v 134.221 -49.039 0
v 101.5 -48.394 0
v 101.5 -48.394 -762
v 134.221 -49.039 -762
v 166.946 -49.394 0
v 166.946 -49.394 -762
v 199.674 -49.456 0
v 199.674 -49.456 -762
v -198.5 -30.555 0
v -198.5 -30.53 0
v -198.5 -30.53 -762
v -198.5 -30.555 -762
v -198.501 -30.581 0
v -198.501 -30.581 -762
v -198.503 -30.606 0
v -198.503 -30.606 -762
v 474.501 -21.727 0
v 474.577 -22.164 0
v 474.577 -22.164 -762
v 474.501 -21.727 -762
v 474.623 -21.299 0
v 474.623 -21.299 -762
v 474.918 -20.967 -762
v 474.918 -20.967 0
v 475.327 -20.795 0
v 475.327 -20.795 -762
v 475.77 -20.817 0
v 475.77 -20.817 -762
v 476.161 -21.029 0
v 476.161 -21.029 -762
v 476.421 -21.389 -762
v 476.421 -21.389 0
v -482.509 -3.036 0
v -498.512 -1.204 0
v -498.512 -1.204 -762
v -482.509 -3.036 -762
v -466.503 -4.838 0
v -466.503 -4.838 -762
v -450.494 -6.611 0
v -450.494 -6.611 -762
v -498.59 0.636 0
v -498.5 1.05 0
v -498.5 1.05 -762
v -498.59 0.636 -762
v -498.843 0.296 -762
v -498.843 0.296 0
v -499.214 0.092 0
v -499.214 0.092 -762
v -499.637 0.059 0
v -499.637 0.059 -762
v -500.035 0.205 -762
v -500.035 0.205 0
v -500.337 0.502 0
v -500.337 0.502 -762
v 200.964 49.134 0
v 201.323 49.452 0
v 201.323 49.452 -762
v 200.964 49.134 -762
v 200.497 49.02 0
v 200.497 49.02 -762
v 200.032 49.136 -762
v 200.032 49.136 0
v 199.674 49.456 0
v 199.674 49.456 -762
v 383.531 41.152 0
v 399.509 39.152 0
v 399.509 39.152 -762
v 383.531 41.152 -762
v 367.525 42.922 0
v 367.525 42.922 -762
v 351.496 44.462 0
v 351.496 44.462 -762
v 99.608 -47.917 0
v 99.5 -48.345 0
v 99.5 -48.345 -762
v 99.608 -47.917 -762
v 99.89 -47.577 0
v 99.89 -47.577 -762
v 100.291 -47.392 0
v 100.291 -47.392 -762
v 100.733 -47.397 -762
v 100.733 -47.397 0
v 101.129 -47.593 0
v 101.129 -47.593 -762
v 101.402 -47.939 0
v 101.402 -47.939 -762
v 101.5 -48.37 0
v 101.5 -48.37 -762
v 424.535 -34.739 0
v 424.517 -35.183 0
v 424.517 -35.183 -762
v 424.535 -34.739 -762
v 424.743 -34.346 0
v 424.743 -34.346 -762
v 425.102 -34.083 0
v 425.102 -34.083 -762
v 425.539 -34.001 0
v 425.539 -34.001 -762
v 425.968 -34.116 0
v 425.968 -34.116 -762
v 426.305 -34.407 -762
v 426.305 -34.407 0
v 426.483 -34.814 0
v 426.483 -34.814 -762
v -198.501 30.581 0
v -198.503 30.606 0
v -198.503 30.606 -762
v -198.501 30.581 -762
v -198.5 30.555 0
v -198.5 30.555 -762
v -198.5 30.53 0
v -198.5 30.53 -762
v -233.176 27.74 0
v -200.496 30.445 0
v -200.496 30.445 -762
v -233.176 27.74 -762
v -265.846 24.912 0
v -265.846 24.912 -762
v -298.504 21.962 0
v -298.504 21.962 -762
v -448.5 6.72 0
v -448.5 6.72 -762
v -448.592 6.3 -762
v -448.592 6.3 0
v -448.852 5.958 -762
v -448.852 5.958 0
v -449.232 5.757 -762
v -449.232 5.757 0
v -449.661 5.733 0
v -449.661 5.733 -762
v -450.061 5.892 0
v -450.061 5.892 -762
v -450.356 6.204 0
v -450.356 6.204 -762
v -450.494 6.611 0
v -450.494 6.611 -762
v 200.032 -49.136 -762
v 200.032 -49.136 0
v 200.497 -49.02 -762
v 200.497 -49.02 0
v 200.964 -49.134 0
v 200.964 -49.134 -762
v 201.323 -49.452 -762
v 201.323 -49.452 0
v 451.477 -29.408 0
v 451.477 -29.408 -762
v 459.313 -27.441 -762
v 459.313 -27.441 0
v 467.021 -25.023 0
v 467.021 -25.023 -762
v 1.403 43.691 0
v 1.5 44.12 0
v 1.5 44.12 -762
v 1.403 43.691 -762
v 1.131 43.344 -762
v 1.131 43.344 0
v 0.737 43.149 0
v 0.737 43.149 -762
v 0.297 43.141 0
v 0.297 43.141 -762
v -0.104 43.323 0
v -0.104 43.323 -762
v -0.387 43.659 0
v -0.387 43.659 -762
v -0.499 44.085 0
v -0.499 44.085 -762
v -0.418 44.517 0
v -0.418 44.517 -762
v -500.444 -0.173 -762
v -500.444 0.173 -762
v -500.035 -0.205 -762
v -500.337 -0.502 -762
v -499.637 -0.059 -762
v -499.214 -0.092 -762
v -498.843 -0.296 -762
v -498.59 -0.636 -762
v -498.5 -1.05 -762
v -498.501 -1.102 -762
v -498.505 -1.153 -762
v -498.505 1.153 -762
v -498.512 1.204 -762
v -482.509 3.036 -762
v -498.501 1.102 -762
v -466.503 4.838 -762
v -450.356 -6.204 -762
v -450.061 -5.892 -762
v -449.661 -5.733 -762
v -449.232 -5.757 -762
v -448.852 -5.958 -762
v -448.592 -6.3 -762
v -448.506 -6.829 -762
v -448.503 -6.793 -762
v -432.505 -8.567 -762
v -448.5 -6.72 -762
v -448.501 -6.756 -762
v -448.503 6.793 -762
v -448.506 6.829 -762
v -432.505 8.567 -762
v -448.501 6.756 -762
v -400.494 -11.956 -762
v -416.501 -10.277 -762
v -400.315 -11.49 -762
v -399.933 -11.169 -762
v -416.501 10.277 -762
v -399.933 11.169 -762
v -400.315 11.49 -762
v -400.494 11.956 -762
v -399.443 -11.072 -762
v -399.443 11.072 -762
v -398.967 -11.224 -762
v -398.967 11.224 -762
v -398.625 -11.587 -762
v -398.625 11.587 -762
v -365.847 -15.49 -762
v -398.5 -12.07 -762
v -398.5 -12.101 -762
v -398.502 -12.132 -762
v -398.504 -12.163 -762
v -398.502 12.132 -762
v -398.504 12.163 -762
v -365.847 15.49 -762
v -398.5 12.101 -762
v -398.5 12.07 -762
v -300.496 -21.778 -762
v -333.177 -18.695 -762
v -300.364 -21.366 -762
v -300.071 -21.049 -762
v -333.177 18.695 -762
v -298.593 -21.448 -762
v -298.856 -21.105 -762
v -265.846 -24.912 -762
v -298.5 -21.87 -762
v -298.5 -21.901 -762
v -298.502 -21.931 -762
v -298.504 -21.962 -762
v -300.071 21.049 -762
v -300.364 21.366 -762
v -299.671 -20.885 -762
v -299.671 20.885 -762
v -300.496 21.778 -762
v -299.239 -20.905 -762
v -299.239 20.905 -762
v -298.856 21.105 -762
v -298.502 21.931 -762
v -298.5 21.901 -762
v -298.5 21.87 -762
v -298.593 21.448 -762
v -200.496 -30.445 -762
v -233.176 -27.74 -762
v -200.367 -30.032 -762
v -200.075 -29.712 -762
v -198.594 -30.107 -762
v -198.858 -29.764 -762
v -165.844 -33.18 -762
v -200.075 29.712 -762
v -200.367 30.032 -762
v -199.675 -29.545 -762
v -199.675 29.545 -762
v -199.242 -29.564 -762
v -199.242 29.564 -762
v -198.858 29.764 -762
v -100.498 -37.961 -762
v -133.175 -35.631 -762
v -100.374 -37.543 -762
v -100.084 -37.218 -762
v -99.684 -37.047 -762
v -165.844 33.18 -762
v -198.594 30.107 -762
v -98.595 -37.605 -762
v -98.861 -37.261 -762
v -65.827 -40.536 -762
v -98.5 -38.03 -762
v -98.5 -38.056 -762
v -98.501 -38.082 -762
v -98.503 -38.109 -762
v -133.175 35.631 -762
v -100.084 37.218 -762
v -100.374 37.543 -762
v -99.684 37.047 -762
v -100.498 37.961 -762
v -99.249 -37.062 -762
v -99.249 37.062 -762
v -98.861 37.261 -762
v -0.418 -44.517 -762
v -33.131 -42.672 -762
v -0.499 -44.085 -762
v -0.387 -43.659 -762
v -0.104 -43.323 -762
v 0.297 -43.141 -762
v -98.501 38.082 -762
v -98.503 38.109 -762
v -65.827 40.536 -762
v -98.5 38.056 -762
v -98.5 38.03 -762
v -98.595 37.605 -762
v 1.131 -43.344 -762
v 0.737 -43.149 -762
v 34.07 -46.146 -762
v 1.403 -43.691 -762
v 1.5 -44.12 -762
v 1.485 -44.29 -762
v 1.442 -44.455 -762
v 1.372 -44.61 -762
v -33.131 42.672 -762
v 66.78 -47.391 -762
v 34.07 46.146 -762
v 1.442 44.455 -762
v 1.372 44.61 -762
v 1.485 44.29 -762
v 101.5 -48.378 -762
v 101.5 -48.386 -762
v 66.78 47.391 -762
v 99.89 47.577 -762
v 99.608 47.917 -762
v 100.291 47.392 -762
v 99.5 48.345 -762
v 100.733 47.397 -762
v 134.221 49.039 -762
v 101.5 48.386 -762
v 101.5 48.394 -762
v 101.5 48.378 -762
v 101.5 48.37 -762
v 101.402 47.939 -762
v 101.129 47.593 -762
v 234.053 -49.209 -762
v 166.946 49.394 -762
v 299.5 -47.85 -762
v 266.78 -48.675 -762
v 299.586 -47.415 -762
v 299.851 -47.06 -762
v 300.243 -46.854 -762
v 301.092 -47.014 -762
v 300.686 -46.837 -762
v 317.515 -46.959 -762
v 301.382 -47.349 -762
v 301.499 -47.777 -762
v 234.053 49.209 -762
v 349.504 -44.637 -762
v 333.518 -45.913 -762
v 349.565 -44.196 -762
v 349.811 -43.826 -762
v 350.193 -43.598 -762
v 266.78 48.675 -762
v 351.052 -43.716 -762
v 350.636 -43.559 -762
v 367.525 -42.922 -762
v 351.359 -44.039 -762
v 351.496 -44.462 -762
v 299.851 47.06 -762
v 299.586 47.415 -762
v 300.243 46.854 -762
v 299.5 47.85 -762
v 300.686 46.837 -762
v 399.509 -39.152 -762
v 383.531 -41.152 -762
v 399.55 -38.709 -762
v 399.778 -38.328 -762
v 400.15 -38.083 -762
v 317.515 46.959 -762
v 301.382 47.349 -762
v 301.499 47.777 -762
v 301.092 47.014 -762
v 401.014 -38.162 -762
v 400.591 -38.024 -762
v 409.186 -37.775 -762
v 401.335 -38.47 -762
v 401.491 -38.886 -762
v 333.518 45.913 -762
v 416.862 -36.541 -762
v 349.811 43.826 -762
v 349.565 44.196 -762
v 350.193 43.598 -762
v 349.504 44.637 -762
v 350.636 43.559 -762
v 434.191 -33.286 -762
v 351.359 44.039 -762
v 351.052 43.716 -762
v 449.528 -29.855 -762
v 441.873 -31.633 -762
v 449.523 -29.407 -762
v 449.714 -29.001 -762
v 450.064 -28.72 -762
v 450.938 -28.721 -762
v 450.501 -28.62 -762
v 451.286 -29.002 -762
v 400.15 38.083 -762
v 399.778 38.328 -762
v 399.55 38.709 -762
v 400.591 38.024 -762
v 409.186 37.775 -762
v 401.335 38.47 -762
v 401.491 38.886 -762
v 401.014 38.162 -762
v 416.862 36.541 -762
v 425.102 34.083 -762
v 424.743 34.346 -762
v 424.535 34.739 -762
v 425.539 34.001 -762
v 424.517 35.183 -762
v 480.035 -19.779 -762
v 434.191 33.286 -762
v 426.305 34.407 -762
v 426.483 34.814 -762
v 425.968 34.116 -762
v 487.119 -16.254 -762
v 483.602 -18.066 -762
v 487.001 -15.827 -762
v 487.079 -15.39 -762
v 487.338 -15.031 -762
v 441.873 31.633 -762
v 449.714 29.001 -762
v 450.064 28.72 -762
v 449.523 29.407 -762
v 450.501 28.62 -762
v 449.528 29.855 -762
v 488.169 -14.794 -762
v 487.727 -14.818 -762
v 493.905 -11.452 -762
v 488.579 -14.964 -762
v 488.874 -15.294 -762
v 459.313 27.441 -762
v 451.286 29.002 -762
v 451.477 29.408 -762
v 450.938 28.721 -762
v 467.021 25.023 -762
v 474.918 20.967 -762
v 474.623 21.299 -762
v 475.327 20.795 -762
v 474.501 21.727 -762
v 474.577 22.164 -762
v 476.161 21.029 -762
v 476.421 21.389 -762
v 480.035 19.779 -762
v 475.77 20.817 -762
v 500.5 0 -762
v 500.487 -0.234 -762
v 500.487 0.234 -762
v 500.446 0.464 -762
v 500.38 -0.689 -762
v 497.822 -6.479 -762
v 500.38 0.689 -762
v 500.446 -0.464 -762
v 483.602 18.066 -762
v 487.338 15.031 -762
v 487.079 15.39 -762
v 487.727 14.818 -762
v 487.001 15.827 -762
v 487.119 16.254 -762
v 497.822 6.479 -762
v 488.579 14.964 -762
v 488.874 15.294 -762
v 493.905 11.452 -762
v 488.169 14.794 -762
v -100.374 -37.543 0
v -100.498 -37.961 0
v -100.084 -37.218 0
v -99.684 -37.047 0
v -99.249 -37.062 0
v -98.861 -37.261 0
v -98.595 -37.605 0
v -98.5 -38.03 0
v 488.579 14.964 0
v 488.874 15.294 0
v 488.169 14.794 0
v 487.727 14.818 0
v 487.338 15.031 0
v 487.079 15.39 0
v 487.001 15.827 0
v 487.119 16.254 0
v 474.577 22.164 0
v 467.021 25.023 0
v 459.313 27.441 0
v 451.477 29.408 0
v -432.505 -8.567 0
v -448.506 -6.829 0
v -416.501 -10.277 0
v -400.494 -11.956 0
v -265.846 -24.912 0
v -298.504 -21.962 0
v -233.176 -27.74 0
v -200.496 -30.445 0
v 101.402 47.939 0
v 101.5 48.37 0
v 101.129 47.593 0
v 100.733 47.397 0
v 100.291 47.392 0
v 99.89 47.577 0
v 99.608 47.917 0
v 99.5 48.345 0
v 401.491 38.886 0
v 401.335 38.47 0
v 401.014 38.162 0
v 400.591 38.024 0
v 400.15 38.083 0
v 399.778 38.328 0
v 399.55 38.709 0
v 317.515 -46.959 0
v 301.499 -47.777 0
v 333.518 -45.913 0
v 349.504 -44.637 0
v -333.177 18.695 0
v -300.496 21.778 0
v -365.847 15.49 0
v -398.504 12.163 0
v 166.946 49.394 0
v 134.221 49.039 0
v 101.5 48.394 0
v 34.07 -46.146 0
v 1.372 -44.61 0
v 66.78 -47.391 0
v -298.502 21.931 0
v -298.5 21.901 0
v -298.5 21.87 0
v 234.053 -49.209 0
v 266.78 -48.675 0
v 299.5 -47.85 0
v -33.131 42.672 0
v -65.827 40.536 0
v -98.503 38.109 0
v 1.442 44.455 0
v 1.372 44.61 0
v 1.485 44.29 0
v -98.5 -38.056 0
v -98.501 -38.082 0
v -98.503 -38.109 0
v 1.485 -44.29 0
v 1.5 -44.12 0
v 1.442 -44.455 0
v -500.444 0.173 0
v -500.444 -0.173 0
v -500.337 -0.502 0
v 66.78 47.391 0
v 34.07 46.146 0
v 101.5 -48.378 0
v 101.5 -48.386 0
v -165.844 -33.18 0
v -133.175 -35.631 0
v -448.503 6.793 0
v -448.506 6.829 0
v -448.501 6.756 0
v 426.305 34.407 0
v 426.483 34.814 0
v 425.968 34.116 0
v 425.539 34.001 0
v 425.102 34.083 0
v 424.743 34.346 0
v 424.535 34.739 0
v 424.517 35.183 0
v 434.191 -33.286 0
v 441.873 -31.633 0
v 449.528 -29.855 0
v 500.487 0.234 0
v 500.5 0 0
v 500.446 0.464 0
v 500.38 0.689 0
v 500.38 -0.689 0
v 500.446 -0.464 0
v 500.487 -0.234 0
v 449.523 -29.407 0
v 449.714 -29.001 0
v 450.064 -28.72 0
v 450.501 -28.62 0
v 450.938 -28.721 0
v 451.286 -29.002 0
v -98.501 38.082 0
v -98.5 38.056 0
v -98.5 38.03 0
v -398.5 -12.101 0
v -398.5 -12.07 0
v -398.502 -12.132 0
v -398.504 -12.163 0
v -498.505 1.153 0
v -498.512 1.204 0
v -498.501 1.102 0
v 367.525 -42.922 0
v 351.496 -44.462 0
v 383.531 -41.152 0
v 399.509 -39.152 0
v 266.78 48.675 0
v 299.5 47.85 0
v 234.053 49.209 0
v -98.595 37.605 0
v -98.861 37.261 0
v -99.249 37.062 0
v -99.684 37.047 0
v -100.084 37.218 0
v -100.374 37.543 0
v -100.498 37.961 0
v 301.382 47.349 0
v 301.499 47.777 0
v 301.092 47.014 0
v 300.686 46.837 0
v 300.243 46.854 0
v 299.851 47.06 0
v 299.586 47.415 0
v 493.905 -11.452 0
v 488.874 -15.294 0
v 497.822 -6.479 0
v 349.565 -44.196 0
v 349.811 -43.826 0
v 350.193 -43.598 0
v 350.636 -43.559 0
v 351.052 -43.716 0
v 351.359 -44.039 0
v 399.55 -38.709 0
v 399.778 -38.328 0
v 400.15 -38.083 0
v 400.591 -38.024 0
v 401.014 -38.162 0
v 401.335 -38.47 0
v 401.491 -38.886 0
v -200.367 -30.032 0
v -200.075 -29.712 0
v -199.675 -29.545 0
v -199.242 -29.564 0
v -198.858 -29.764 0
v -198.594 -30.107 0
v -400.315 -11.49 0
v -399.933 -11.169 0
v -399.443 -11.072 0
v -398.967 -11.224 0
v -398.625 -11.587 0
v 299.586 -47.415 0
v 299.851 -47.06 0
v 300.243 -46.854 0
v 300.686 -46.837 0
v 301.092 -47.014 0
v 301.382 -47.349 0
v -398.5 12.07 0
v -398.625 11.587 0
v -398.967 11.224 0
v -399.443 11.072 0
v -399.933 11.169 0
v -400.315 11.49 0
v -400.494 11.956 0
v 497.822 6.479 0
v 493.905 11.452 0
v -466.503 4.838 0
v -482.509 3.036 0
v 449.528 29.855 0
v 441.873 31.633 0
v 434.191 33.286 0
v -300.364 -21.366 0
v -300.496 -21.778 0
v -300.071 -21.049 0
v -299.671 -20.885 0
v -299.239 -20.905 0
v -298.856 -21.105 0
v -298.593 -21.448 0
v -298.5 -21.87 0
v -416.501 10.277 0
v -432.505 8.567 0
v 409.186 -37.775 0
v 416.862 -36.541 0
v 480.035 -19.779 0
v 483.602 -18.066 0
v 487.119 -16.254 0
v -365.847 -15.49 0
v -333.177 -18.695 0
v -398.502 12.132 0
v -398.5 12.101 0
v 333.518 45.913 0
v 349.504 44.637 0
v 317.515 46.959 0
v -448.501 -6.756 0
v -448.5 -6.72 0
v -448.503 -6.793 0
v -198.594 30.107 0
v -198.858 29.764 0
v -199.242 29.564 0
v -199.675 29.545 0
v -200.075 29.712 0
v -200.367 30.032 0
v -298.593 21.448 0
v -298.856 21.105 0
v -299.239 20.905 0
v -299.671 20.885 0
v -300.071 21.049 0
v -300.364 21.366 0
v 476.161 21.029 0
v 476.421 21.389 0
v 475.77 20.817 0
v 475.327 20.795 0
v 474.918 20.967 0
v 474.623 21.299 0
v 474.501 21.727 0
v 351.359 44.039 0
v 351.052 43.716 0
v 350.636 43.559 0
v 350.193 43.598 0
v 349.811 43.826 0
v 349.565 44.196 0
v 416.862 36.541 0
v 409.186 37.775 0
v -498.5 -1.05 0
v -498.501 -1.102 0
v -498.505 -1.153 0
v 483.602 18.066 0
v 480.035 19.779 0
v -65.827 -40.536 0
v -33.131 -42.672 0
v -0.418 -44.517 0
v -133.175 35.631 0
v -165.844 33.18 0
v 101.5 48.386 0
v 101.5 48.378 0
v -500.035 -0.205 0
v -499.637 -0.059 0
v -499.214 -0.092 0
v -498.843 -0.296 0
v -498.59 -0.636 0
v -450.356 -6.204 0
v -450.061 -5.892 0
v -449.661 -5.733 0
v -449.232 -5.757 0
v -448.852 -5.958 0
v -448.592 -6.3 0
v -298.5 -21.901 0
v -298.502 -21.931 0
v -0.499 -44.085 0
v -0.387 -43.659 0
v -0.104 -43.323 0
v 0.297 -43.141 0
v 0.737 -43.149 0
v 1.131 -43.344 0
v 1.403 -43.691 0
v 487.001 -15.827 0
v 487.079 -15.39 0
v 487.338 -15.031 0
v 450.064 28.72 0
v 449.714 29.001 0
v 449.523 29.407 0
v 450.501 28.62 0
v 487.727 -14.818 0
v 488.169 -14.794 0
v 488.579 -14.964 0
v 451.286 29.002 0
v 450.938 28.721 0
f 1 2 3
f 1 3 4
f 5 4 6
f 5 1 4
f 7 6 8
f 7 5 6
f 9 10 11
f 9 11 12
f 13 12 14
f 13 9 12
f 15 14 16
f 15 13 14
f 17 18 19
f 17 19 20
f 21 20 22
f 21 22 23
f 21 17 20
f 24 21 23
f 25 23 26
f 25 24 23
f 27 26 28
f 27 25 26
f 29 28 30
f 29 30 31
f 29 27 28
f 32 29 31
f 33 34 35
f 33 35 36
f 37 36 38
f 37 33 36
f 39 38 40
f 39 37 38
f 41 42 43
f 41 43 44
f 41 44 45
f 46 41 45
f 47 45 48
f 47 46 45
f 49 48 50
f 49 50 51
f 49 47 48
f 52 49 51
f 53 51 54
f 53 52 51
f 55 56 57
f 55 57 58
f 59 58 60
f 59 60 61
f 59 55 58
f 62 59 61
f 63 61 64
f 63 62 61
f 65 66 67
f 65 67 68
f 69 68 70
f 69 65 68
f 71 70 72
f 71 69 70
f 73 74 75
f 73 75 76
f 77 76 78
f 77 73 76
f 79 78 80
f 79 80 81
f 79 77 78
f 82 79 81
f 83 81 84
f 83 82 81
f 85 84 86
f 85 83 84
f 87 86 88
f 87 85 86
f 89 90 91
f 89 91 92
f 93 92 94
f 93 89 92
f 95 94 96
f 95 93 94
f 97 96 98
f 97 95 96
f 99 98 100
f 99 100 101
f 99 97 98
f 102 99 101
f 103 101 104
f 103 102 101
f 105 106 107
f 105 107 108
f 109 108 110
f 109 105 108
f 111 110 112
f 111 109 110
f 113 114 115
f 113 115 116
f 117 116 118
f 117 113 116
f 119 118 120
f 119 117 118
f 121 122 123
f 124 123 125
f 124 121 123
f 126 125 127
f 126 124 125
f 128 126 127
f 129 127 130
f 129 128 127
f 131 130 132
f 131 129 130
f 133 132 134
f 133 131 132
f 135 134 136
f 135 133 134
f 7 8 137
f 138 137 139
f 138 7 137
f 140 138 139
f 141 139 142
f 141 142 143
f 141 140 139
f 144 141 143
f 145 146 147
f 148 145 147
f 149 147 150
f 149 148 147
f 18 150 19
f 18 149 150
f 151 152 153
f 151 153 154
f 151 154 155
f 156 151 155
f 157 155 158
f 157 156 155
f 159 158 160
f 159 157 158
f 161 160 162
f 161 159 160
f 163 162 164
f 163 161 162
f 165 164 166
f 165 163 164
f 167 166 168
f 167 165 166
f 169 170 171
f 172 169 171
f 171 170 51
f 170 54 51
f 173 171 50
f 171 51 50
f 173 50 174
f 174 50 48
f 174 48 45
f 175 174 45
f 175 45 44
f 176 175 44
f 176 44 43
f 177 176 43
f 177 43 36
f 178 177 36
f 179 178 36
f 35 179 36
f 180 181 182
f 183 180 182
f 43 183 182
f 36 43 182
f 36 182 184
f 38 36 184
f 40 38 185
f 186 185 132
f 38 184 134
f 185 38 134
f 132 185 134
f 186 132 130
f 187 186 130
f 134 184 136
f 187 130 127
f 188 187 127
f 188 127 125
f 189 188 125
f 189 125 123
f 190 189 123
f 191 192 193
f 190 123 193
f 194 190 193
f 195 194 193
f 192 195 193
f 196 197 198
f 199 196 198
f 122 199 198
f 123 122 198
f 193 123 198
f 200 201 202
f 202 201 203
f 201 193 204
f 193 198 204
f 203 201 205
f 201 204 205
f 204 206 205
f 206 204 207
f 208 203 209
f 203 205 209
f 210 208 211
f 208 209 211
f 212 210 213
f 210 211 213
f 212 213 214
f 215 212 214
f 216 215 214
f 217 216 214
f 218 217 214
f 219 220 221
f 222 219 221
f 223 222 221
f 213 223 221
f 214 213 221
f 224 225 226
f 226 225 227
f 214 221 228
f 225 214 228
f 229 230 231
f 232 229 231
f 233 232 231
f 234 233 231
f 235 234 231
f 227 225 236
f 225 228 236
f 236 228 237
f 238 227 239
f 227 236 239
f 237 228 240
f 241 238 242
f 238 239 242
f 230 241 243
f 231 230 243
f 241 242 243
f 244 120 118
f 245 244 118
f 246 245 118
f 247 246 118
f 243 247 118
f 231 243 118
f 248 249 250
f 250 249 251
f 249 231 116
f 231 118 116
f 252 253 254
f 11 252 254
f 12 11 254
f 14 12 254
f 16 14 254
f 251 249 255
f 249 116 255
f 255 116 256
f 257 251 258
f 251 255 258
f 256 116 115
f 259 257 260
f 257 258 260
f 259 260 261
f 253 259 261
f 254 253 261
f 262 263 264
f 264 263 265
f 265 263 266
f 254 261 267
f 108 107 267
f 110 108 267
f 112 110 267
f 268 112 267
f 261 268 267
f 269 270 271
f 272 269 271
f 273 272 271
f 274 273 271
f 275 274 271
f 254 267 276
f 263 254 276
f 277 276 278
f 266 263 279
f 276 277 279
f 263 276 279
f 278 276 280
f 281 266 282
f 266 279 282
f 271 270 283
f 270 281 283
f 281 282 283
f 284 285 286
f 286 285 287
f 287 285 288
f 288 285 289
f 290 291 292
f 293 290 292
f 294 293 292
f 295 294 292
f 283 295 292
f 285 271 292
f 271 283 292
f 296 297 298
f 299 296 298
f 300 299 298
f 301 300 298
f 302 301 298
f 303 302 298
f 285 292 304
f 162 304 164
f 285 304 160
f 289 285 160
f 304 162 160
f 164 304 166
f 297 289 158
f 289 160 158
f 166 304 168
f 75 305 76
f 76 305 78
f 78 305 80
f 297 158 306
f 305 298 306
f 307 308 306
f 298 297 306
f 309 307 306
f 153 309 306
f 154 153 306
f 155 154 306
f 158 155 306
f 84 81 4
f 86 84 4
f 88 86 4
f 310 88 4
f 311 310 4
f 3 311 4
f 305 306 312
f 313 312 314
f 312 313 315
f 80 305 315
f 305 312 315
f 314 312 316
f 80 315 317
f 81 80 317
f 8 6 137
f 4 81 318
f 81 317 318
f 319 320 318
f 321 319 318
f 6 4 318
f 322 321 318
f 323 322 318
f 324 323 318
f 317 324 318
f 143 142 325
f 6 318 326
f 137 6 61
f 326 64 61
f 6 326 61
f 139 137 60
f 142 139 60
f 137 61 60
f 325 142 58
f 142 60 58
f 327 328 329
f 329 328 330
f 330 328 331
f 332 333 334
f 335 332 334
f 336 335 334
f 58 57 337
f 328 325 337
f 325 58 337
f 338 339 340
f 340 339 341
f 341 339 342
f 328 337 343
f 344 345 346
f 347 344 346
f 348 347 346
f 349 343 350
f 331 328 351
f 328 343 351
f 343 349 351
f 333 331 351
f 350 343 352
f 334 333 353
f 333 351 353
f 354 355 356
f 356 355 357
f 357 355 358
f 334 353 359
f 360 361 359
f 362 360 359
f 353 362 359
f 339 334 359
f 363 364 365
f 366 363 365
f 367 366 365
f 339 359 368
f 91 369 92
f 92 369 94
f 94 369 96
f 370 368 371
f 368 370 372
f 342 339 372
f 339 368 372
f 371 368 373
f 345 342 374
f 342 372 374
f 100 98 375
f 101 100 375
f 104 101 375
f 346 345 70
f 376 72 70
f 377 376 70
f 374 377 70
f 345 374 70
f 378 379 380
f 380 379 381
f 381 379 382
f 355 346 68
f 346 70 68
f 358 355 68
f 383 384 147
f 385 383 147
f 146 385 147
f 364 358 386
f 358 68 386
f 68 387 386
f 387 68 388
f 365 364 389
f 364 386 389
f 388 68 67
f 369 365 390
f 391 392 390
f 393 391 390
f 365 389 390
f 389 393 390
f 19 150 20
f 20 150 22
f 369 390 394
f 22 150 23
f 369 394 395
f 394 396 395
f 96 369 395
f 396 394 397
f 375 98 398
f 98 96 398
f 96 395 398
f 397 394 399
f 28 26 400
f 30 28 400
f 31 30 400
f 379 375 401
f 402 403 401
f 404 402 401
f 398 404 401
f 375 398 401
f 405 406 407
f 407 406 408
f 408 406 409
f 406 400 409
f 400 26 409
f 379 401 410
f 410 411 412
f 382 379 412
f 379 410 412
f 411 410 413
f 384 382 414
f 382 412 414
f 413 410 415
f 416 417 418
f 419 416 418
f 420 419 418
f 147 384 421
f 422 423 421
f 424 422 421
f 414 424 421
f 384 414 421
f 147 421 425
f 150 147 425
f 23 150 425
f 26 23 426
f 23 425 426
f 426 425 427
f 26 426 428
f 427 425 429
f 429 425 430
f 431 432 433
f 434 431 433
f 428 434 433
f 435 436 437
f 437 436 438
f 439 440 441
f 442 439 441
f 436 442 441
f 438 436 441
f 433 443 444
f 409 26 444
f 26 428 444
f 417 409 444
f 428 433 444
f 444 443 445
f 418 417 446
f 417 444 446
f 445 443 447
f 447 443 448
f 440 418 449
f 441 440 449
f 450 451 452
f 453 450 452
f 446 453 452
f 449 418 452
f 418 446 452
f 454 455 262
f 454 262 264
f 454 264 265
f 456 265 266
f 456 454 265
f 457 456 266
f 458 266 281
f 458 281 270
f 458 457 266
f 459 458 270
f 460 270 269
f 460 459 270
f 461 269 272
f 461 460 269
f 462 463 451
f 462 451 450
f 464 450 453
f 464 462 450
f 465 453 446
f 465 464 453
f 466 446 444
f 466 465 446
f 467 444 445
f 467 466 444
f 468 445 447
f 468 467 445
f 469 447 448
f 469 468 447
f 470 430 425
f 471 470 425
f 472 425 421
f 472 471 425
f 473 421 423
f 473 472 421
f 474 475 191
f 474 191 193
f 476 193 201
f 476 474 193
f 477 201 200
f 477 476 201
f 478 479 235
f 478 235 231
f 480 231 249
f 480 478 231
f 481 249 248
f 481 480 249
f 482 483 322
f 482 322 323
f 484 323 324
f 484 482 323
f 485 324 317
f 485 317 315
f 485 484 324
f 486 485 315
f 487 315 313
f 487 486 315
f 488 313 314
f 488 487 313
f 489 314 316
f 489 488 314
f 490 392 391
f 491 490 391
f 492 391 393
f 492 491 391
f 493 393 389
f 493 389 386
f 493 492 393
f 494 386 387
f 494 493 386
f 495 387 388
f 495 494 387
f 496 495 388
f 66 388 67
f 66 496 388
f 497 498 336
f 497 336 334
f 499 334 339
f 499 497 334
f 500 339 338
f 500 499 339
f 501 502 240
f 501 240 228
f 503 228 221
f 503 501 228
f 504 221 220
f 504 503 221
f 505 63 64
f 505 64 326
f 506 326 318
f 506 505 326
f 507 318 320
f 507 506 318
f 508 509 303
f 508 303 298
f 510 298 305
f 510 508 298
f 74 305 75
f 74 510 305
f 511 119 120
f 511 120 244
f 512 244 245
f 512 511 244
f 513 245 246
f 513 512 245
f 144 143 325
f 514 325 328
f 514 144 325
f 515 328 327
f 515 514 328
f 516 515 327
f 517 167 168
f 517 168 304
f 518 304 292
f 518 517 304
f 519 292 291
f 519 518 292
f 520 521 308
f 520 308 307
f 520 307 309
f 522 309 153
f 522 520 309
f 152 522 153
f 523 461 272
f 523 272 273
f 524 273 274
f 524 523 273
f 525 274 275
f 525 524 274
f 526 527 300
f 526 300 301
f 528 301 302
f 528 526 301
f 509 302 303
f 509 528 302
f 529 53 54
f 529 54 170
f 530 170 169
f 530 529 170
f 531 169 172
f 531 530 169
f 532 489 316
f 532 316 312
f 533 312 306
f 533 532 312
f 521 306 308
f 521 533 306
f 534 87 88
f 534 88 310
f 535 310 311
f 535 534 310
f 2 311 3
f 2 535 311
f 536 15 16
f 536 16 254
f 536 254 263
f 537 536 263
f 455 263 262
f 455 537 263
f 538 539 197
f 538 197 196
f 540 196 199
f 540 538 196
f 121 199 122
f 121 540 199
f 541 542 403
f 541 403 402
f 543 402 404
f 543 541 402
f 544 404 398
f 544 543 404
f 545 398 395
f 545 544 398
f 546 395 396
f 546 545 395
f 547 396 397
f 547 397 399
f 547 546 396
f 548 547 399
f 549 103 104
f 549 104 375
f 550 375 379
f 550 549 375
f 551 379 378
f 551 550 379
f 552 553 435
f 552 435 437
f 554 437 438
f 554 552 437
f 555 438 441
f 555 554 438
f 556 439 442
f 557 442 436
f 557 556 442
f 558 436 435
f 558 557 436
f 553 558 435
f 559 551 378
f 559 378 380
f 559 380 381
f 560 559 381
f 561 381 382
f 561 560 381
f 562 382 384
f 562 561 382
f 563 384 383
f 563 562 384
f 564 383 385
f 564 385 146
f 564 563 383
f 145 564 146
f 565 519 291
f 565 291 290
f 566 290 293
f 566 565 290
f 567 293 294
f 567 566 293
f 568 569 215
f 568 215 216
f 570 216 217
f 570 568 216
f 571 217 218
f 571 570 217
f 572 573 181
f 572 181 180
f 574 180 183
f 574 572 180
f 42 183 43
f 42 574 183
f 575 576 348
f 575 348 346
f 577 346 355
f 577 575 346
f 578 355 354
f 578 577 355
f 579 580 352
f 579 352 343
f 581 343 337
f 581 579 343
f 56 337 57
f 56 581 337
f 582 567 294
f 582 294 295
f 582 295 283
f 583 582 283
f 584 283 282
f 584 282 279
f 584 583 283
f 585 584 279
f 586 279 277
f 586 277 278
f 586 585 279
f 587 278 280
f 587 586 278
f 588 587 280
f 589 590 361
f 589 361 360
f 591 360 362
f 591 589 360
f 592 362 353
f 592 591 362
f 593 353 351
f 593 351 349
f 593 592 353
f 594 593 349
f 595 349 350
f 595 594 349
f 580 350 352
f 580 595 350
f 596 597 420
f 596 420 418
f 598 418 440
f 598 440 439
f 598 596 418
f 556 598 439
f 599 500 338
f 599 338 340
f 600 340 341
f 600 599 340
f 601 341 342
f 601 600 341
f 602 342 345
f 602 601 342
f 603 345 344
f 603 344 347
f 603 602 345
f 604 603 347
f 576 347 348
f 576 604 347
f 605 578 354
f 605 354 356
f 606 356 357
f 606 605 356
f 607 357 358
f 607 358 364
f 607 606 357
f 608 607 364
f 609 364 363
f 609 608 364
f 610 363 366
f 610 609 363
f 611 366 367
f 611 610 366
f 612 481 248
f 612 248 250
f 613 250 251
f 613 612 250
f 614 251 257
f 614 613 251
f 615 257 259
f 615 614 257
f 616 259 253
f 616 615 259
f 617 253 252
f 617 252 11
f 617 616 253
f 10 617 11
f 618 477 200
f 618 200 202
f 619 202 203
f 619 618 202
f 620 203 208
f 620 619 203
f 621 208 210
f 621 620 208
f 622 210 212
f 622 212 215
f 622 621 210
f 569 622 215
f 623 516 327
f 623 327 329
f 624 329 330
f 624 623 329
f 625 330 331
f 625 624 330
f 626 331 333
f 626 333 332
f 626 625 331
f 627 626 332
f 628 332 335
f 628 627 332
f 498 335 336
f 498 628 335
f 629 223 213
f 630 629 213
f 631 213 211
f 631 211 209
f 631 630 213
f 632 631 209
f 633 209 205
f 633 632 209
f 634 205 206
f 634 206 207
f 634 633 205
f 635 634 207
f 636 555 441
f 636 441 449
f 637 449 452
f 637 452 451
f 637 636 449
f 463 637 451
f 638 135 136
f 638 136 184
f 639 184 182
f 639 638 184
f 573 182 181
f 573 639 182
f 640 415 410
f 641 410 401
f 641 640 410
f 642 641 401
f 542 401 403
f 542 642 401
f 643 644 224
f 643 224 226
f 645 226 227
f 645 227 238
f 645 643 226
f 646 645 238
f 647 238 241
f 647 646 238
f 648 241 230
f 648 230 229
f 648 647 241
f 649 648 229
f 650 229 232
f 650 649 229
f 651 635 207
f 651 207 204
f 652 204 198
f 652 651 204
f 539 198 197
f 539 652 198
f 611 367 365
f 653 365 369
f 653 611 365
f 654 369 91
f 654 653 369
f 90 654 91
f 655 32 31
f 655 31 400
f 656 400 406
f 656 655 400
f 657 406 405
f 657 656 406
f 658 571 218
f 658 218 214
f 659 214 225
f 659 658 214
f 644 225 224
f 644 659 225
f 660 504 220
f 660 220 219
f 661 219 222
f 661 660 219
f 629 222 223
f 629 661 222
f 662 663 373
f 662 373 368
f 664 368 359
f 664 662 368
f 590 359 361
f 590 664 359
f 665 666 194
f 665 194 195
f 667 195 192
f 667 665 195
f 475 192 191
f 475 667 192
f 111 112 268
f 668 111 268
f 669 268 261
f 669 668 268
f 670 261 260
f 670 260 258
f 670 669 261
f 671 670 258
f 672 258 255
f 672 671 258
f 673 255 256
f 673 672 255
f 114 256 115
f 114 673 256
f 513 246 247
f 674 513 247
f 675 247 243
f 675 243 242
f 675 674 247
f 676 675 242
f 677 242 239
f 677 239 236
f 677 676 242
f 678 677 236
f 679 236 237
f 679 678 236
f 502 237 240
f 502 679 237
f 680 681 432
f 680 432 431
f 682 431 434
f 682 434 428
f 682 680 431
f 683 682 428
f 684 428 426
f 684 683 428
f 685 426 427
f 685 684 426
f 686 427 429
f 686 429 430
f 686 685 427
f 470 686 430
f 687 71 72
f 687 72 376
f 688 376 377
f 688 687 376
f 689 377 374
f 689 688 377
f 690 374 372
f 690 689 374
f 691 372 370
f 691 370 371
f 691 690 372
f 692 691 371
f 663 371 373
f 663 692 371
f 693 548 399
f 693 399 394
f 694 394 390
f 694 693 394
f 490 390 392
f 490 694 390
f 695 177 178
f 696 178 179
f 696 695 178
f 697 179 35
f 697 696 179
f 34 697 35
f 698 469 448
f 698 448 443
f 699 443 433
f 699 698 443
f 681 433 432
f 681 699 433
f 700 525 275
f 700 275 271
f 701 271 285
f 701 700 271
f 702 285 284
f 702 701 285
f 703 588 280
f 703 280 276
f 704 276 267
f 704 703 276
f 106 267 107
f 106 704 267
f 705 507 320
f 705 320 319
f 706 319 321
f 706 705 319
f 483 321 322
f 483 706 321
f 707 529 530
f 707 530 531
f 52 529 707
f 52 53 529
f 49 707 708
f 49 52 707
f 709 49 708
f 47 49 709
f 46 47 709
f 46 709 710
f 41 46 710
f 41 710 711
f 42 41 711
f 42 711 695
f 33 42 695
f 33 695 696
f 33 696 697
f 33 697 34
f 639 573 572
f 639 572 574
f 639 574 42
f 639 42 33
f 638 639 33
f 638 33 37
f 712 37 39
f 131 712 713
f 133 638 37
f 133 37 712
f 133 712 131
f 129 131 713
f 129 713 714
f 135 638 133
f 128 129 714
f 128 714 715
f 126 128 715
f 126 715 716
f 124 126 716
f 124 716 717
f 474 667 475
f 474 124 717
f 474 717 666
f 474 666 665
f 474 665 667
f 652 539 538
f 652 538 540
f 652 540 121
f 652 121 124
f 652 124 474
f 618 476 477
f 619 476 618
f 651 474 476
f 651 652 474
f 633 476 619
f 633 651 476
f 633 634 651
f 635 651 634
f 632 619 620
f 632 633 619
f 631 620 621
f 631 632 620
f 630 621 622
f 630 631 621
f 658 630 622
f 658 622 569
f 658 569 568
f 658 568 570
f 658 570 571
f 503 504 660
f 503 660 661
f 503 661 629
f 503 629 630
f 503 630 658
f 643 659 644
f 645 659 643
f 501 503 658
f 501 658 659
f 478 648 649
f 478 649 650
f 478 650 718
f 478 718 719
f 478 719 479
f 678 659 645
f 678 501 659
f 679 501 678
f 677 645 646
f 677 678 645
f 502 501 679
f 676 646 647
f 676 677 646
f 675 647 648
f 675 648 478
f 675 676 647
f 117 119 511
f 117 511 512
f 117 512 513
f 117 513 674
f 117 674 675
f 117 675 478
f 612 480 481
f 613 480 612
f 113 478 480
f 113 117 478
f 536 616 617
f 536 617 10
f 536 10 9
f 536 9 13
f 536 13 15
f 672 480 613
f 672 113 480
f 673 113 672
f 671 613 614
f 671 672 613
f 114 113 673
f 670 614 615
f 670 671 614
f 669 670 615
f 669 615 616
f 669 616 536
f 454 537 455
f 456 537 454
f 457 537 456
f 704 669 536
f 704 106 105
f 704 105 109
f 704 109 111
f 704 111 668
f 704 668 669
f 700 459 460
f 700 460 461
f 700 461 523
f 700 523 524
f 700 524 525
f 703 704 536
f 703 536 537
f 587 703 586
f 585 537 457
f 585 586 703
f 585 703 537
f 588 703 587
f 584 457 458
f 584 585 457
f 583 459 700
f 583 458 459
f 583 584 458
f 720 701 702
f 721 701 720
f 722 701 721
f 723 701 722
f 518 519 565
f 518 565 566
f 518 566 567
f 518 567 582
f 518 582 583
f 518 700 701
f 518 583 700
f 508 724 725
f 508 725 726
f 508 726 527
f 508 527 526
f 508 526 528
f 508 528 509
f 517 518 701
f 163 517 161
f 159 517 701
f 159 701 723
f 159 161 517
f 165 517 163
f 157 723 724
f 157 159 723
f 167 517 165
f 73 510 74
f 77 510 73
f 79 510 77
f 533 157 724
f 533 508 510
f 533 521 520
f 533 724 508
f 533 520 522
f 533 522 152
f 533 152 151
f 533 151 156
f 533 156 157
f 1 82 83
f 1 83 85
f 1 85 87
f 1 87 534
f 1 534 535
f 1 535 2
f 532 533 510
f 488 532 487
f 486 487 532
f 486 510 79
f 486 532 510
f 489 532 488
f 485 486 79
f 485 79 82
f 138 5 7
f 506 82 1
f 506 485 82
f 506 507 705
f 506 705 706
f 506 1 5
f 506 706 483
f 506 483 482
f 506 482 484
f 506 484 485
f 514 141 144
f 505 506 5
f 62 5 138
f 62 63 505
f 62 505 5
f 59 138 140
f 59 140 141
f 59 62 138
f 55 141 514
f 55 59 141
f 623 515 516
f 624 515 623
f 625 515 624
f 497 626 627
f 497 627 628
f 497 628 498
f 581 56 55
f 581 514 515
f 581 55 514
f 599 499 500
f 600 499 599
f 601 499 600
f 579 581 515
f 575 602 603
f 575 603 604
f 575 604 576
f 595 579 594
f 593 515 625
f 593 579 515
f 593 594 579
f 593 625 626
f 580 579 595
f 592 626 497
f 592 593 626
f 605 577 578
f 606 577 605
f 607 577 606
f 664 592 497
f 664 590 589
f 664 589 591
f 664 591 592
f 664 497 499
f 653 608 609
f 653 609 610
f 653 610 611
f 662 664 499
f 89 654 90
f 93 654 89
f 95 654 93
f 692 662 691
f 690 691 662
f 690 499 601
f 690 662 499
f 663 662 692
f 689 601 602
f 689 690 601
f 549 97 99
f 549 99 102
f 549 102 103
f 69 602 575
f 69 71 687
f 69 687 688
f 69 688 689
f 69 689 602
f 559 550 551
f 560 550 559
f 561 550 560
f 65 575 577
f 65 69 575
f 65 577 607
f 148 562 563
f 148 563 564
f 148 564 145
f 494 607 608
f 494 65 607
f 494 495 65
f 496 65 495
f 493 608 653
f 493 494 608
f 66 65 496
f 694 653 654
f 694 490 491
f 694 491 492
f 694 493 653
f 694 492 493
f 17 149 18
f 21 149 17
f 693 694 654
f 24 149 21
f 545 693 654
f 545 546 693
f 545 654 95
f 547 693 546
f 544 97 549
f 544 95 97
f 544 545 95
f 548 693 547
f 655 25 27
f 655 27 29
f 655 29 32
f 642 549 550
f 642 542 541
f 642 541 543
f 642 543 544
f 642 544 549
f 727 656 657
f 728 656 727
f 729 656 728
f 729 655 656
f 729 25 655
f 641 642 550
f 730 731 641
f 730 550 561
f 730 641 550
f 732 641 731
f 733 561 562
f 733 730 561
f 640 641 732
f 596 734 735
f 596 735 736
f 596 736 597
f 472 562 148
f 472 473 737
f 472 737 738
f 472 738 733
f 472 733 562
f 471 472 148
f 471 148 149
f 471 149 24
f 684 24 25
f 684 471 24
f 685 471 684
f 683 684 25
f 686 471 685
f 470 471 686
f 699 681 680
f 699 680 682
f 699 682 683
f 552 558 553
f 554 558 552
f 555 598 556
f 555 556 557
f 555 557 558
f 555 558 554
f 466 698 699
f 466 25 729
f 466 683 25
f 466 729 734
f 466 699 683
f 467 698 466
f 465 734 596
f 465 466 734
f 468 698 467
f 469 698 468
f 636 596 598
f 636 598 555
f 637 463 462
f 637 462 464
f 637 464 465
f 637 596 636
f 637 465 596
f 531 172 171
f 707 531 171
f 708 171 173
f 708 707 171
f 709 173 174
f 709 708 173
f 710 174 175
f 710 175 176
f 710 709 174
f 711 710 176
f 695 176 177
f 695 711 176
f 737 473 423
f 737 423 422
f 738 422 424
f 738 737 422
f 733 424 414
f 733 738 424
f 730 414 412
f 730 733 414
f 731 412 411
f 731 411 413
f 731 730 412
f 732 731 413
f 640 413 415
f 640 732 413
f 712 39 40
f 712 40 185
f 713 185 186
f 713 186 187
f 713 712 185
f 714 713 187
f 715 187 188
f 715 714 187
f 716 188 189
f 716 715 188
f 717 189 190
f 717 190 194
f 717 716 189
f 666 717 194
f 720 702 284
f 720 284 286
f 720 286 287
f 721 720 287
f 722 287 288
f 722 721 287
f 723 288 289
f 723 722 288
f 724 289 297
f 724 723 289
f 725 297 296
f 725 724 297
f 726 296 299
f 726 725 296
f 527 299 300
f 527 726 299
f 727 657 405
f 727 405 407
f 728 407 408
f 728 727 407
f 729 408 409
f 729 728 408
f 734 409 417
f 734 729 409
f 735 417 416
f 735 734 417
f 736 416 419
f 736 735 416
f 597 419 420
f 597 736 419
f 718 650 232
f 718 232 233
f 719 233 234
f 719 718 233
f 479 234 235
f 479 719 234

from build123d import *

# Parameters (mm, degrees)
F1_DEPTH = 762


# Not quite as in the source:
# - ends of sketch curves that miss each other by under 0.0002 mm in the source are joined


with BuildPart() as f1:
    # F0 (on Top) → F1 (new body)
    with BuildSketch(Plane.XY):
        with BuildLine():
            ThreePointArc((488.8742323068, 15.2944921486), (487.5203307918, 14.9025505993), (487.1193724988, 16.2538092487))
            ThreePointArc((487.1193724988, 16.2538092487), (481.824523523, 18.9352573397), (476.4205037428, 21.389266255))
            ThreePointArc((476.4205037428, 21.389266255), (475.1125647356, 20.8581030883), (474.5767217389, 22.1641318166))
            ThreePointArc((474.5767217389, 22.1641318166), (463.1842997703, 26.2876905948), (451.4772940324, 29.4081123545))
            ThreePointArc((451.4772940324, 29.4081123545), (450.276485478, 28.6452994006), (449.5280311535, 29.8551096795))
            ThreePointArc((449.5280311535, 29.8551096795), (438.0355044136, 32.4749833354), (426.4826400862, 34.8144778691))
            ThreePointArc((426.4826400862, 34.8144778691), (425.3154916622, 34.0171690515), (424.5169792351, 35.1834943482))
            ThreePointArc((424.5169792351, 35.1834943482), (413.0262686458, 37.1733622263), (401.4909912337, 38.8860732489))
            ThreePointArc((401.4909912337, 38.8860732489), (400.3671427029, 38.0288648232), (399.5087220344, 39.1517876884))
            ThreePointArc((399.5087220344, 39.1517876884), (375.5310617416, 42.0658475749), (351.4961188511, 44.4619816239))
            ThreePointArc((351.4961188511, 44.4619816239), (350.4124269023, 43.5538419038), (349.5038028578, 44.6371278018))
            ThreePointArc((349.5038028578, 44.6371278018), (325.5182950967, 46.4647415416), (301.4990594281, 47.7766380455))
            ThreePointArc((301.4990594281, 47.7766380455), (300.4634214455, 46.8206692193), (299.5004439239, 47.8497934687))
            ThreePointArc((299.5004439239, 47.8497934687), (250.4170586651, 48.9784061279), (201.3229831968, 49.4519342839))
            ThreePointArc((201.3229831968, 49.4519342839), (200.4972514489, 49.0200037773), (199.6739065342, 49.4564668725))
            ThreePointArc((199.6739065342, 49.4564668725), (150.5832624149, 49.2528772685), (101.4997048201, 48.3942955287))
            ThreePointArc((101.4997048201, 48.3942955287), (101.4999262023, 48.3821486609), (101.5, 48.37))
            ThreePointArc((101.5, 48.37), (100.5122846343, 47.370075459), (99.5003018245, 48.3454325854))
            ThreePointArc((99.5003018245, 48.3454325854), (50.4236366017, 46.8049664772), (1.3719002627, 44.6096835018))
            ThreePointArc((1.3719002627, 44.6096835018), (1.4674451568, 44.3730807552), (1.5, 44.12))
            ThreePointArc((1.5, 44.12), (0.297194356, 43.1407809894), (-0.4177397415, 44.5171822841))
            ThreePointArc((-0.4177397415, 44.5171822841), (-49.4818219256, 41.6405010198), (-98.503098248, 38.1086568293))
            ThreePointArc((-98.503098248, 38.1086568293), (-98.5007748622, 38.0693589124), (-98.5, 38.03))
            ThreePointArc((-98.5, 38.03), (-99.4653855857, 37.0305992584), (-100.4976036846, 37.9608126573))
            ThreePointArc((-100.4976036846, 37.9608126573), (-149.5105569813, 34.4207797542), (-198.5029069122, 30.606193006))
            ThreePointArc((-198.5029069122, 30.606193006), (-198.5007269923, 30.568124219), (-198.5, 30.53))
            ThreePointArc((-198.5, 30.53), (-199.4575267193, 29.5309023969), (-200.4963920408, 30.445130094))
            ThreePointArc((-200.4963920408, 30.445130094), (-249.5122047164, 26.3409146536), (-298.5042296621, 21.9618772772))
            ThreePointArc((-298.5042296621, 21.9618772772), (-298.5010579752, 21.915987292), (-298.5, 21.87))
            ThreePointArc((-298.5, 21.87), (-299.4539559536, 20.8710605895), (-300.4957598916, 21.7780095749))
            ThreePointArc((-300.4957598916, 21.7780095749), (-349.5135367847, 17.1080068146), (-398.5043233752, 12.1628873449))
            ThreePointArc((-398.5043233752, 12.1628873449), (-398.5010814285, 12.1164939523), (-398.5, 12.07))
            ThreePointArc((-398.5, 12.07), (-399.443021479, 11.0716245956), (-400.4935068963, 11.9562280921))
            ThreePointArc((-400.4935068963, 11.9562280921), (-424.5032598568, 9.4256444152), (-448.5059560316, 6.8289797637))
            ThreePointArc((-448.5059560316, 6.8289797637), (-448.5014901181, 6.7745711994), (-448.5, 6.72))
            ThreePointArc((-448.5, 6.72), (-449.4453720697, 5.7214932202), (-450.4940315785, 6.6109072825))
            ThreePointArc((-450.4940315785, 6.6109072825), (-474.5067314104, 3.9406998666), (-498.5119845054, 1.2043547292))
            ThreePointArc((-498.5119845054, 1.2043547292), (-498.5030006282, 1.1274096421), (-498.5, 1.05))
            ThreePointArc((-498.5, 1.05), (-499.2142366184, 0.0916997914), (-500.3366785795, 0.5023057837))
            ThreePointArc((-500.3366785795, 0.5023057837), (-500.458136, 0), (-500.3366785795, -0.5023057837))
            ThreePointArc((-500.3366785795, -0.5023057837), (-499.2142366184, -0.0916997914), (-498.5, -1.05))
            ThreePointArc((-498.5, -1.05), (-498.5030005898, -1.1274091465), (-498.5119843519, -1.2043537469))
            ThreePointArc((-498.5119843519, -1.2043537469), (-474.5067312795, -3.9406988813), (-450.49403147, -6.6109062944))
            ThreePointArc((-450.49403147, -6.6109062944), (-449.4453715735, -5.7214932474), (-448.5, -6.72))
            ThreePointArc((-448.5, -6.72), (-448.501490091, -6.7745707031), (-448.5059559233, -6.8289787756))
            ThreePointArc((-448.5059559233, -6.8289787756), (-424.5032597461, -9.425643427), (-400.4935067831, -11.9562271039))
            ThreePointArc((-400.4935067831, -11.9562271039), (-399.4430209825, -11.0716246239), (-398.5, -12.07))
            ThreePointArc((-398.5, -12.07), (-398.5010814054, -12.1164934555), (-398.5043232828, -12.1628863545))
            ThreePointArc((-398.5043232828, -12.1628863545), (-349.5135366927, -17.1080058236), (-300.4957598, -21.7780085834))
            ThreePointArc((-300.4957598, -21.7780085834), (-299.4539554563, -20.8710606125), (-298.5, -21.87))
            ThreePointArc((-298.5, -21.87), (-298.5010579523, -21.9159867947), (-298.5042295706, -21.9618762856))
            ThreePointArc((-298.5042295706, -21.9618762856), (-249.5122046283, -26.3409136613), (-200.4963919562, -30.4451291009))
            ThreePointArc((-200.4963919562, -30.4451291009), (-199.4575262213, -29.5309024181), (-198.5, -30.53))
            ThreePointArc((-198.5, -30.53), (-198.5007269733, -30.568123721), (-198.5029068362, -30.6061920122))
            ThreePointArc((-198.5029068362, -30.6061920122), (-149.5105569088, -34.4207787596), (-100.4976036156, -37.9608116621))
            ThreePointArc((-100.4976036156, -37.9608116621), (-99.4653850872, -37.0305992757), (-98.5, -38.03))
            ThreePointArc((-98.5, -38.03), (-98.5007748622, -38.0693589124), (-98.503098248, -38.1086568293))
            ThreePointArc((-98.503098248, -38.1086568293), (-49.4818219256, -41.6405010198), (-0.4177397415, -44.5171822841))
            ThreePointArc((-0.4177397415, -44.5171822841), (0.297194356, -43.1407809894), (1.5, -44.12))
            ThreePointArc((1.5, -44.12), (1.4674451568, -44.3730807552), (1.3719002627, -44.6096835018))
            ThreePointArc((1.3719002627, -44.6096835018), (50.4236366017, -46.8049664772), (99.5003018245, -48.3454325854))
            ThreePointArc((99.5003018245, -48.3454325854), (100.5122846343, -47.370075459), (101.5, -48.37))
            ThreePointArc((101.5, -48.37), (101.4999262023, -48.3821486609), (101.4997048201, -48.3942955287))
            ThreePointArc((101.4997048201, -48.3942955287), (150.5832624149, -49.2528772685), (199.6739065342, -49.4564668725))
            ThreePointArc((199.6739065342, -49.4564668725), (200.4972514489, -49.0200037773), (201.3229831968, -49.4519342839))
            ThreePointArc((201.3229831968, -49.4519342839), (250.4170586651, -48.9784061279), (299.5004439239, -47.8497934687))
            ThreePointArc((299.5004439239, -47.8497934687), (300.4634214455, -46.8206692193), (301.4990594281, -47.7766380455))
            ThreePointArc((301.4990594281, -47.7766380455), (325.5182950967, -46.4647415416), (349.5038028578, -44.6371278018))
            ThreePointArc((349.5038028578, -44.6371278018), (350.4124269023, -43.5538419038), (351.4961188511, -44.4619816239))
            ThreePointArc((351.4961188511, -44.4619816239), (375.5310617416, -42.0658475749), (399.5087220344, -39.1517876884))
            ThreePointArc((399.5087220344, -39.1517876884), (400.3671422118, -38.0288648891), (401.490991101, -38.886072267))
            ThreePointArc((401.490991101, -38.886072267), (413.0262684891, -37.1733612515), (424.5169790547, -35.1834933817))
            ThreePointArc((424.5169790547, -35.1834933817), (425.3154916626, -34.0171690514), (426.4826399039, -34.8144769037))
            ThreePointArc((426.4826399039, -34.8144769037), (438.035504208, -32.4749823797), (449.5280309249, -29.8551087345))
            ThreePointArc((449.5280309249, -29.8551087345), (450.2764859518, -28.645299292), (451.4772940324, -29.4081123545))
            ThreePointArc((451.4772940324, -29.4081123545), (463.1842997703, -26.2876905948), (474.5767217389, -22.1641318166))
            ThreePointArc((474.5767217389, -22.1641318166), (475.1125647356, -20.8581030883), (476.4205037428, -21.389266255))
            ThreePointArc((476.4205037428, -21.389266255), (481.824523523, -18.9352573397), (487.1193724988, -16.2538092487))
            ThreePointArc((487.1193724988, -16.2538092487), (487.5203307918, -14.9025505993), (488.8742323068, -15.2944921486))
            ThreePointArc((488.8742323068, -15.2944921486), (496.019452289, -9.0885932824), (500.3796021729, -0.6888050517))
            ThreePointArc((500.3796021729, -0.6888050517), (500.4696732905, -0.3496239971), (500.499999, 0))
            ThreePointArc((500.499999, 0), (500.4696732095, 0.3496244605), (500.379601649, 0.6888058734))
            ThreePointArc((500.379601649, 0.6888058734), (496.0194519925, 9.0885936587), (488.8742323068, 15.2944921486))
        make_face()
    extrude(amount=-F1_DEPTH)


solid = f1.part
